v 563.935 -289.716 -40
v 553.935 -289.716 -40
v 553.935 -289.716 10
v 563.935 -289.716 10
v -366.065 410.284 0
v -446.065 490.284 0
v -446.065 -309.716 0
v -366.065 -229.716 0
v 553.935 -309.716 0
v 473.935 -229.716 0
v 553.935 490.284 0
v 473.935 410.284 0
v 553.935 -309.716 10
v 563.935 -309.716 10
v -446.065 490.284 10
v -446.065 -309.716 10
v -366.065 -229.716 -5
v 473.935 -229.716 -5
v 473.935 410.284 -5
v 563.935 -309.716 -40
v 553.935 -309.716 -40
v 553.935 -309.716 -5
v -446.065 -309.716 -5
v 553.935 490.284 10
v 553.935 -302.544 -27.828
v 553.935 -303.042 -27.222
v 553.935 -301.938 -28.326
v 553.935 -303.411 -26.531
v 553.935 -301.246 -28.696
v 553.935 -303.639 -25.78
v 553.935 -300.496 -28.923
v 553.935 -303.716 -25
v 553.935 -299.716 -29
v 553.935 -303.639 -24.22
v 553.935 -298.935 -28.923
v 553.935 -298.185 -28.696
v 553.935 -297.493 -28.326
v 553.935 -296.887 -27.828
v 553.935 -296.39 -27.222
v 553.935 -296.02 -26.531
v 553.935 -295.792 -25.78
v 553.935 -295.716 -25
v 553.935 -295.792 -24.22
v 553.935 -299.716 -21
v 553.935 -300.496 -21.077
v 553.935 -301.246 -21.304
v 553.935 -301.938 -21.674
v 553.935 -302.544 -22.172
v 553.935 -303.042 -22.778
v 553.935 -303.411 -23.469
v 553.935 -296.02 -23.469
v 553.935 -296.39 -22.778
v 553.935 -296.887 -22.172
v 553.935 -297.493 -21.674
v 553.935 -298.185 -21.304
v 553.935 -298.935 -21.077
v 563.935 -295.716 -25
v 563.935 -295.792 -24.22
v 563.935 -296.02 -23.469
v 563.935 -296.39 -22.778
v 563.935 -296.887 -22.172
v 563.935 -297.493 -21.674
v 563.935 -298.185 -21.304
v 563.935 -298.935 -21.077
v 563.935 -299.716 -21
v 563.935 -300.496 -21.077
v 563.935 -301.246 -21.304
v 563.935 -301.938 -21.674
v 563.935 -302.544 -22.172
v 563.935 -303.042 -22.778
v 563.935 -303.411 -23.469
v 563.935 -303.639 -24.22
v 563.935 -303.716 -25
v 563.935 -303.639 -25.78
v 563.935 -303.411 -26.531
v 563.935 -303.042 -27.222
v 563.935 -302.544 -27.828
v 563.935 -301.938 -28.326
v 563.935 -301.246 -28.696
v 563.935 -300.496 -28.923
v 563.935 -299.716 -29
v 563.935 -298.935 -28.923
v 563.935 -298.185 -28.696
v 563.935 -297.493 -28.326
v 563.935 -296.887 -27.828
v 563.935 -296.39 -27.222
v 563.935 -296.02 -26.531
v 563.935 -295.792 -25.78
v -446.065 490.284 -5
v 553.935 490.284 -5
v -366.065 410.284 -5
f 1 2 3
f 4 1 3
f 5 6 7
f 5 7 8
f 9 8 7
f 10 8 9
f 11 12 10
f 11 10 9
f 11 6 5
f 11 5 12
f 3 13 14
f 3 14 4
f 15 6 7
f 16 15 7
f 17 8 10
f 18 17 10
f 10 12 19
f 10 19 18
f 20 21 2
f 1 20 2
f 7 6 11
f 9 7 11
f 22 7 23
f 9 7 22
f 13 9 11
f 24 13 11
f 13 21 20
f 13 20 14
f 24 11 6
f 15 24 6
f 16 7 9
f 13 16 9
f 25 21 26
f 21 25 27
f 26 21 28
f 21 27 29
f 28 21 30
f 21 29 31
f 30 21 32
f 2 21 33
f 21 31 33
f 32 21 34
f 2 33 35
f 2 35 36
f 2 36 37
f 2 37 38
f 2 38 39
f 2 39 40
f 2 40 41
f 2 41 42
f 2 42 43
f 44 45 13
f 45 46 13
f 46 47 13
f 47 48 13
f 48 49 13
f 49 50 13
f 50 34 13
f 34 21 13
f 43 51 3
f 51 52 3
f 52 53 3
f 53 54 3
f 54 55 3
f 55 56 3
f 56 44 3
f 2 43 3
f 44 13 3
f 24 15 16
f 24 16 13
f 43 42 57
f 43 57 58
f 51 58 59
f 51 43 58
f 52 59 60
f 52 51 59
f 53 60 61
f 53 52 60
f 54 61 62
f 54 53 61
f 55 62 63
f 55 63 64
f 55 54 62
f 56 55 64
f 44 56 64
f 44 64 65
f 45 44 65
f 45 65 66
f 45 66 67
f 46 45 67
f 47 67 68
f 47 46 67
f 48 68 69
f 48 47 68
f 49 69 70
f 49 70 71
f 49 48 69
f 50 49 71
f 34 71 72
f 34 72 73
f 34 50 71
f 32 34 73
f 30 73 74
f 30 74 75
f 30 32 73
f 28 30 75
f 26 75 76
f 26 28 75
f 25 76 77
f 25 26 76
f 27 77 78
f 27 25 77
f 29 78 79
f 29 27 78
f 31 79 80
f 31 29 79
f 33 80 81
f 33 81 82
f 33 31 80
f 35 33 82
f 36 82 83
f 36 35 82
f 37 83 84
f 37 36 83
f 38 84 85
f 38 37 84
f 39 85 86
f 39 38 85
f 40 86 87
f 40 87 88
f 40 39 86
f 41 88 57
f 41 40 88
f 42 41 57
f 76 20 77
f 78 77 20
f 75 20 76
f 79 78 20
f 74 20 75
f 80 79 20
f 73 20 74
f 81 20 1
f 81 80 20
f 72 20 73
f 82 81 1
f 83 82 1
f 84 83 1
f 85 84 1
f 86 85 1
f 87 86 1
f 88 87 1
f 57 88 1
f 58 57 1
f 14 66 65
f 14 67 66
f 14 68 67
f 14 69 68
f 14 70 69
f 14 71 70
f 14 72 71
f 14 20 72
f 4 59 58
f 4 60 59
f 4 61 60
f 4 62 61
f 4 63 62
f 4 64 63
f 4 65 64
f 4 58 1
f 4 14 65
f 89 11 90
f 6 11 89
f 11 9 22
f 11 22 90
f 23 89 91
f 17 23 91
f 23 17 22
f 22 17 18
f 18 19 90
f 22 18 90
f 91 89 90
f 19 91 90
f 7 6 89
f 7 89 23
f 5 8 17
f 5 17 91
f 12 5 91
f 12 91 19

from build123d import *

# Parameters (mm, degrees)
F0_W     = 840
F0_H     = 80
F0_H_2   = 640
F1_DEPTH = 10
F2_DEPTH = 5
F3_W     = 20
F3_H     = 50
F3_R     = 4
F4_DEPTH = 10


# Not quite as in the source:
# - a feature names something its author has since deleted; it is built from what else it names


with BuildPart() as f1:
    # F0 (on Top) → F1 (new body)
    with BuildSketch(Plane.XY):
        Polygon((-446.064549312, 490.2843640471), (-446.064549312, -309.7156359529), (-366.064549312, -309.7156359529), (-366.064549312, -229.7156359529), (-366.064549312, 410.2843640471), (-366.064549312, 490.2843640471), align=None)
        with Locations((53.935450688, -269.7156359529)):
            Rectangle(F0_W, F0_H)
        Polygon((473.935450688, -229.7156359529), (473.935450688, -309.7156359529), (553.935450688, -309.7156359529), (553.935450688, 490.2843640471), (473.935450688, 490.2843640471), (473.935450688, 410.2843640471), align=None)
        with Locations((53.935450688, 90.2843640471)):
            Rectangle(F0_W, F0_H_2)
        with Locations((53.935450688, 450.2843640471)):
            Rectangle(F0_W, F0_H)
    extrude(amount=F1_DEPTH)


with BuildPart() as f2:
    # F0 (on Top) → F2 (new body)
    with BuildSketch(Plane.XY):
        Polygon((-446.064549312, 490.2843640471), (-446.064549312, -309.7156359529), (-366.064549312, -309.7156359529), (-366.064549312, -229.7156359529), (-366.064549312, 410.2843640471), (-366.064549312, 490.2843640471), align=None)
        with Locations((53.935450688, 450.2843640471)):
            Rectangle(F0_W, F0_H)
        with Locations((53.935450688, -269.7156359529)):
            Rectangle(F0_W, F0_H)
        Polygon((473.935450688, -229.7156359529), (473.935450688, -309.7156359529), (553.935450688, -309.7156359529), (553.935450688, 490.2843640471), (473.935450688, 490.2843640471), (473.935450688, 410.2843640471), align=None)
    extrude(amount=-F2_DEPTH)


with BuildPart() as f4:
    # F3 (on face) → F4 (new body)
    with BuildSketch(Plane.YZ.offset(553.935450688)):
        with Locations((-299.7156359529, -15)):
            Rectangle(F3_W, F3_H)
        with Locations((-299.7156359529, -25)):
            Circle(F3_R, mode=Mode.SUBTRACT)
    extrude(amount=F4_DEPTH)


solid = Compound([f1.part, f2.part, f4.part])
